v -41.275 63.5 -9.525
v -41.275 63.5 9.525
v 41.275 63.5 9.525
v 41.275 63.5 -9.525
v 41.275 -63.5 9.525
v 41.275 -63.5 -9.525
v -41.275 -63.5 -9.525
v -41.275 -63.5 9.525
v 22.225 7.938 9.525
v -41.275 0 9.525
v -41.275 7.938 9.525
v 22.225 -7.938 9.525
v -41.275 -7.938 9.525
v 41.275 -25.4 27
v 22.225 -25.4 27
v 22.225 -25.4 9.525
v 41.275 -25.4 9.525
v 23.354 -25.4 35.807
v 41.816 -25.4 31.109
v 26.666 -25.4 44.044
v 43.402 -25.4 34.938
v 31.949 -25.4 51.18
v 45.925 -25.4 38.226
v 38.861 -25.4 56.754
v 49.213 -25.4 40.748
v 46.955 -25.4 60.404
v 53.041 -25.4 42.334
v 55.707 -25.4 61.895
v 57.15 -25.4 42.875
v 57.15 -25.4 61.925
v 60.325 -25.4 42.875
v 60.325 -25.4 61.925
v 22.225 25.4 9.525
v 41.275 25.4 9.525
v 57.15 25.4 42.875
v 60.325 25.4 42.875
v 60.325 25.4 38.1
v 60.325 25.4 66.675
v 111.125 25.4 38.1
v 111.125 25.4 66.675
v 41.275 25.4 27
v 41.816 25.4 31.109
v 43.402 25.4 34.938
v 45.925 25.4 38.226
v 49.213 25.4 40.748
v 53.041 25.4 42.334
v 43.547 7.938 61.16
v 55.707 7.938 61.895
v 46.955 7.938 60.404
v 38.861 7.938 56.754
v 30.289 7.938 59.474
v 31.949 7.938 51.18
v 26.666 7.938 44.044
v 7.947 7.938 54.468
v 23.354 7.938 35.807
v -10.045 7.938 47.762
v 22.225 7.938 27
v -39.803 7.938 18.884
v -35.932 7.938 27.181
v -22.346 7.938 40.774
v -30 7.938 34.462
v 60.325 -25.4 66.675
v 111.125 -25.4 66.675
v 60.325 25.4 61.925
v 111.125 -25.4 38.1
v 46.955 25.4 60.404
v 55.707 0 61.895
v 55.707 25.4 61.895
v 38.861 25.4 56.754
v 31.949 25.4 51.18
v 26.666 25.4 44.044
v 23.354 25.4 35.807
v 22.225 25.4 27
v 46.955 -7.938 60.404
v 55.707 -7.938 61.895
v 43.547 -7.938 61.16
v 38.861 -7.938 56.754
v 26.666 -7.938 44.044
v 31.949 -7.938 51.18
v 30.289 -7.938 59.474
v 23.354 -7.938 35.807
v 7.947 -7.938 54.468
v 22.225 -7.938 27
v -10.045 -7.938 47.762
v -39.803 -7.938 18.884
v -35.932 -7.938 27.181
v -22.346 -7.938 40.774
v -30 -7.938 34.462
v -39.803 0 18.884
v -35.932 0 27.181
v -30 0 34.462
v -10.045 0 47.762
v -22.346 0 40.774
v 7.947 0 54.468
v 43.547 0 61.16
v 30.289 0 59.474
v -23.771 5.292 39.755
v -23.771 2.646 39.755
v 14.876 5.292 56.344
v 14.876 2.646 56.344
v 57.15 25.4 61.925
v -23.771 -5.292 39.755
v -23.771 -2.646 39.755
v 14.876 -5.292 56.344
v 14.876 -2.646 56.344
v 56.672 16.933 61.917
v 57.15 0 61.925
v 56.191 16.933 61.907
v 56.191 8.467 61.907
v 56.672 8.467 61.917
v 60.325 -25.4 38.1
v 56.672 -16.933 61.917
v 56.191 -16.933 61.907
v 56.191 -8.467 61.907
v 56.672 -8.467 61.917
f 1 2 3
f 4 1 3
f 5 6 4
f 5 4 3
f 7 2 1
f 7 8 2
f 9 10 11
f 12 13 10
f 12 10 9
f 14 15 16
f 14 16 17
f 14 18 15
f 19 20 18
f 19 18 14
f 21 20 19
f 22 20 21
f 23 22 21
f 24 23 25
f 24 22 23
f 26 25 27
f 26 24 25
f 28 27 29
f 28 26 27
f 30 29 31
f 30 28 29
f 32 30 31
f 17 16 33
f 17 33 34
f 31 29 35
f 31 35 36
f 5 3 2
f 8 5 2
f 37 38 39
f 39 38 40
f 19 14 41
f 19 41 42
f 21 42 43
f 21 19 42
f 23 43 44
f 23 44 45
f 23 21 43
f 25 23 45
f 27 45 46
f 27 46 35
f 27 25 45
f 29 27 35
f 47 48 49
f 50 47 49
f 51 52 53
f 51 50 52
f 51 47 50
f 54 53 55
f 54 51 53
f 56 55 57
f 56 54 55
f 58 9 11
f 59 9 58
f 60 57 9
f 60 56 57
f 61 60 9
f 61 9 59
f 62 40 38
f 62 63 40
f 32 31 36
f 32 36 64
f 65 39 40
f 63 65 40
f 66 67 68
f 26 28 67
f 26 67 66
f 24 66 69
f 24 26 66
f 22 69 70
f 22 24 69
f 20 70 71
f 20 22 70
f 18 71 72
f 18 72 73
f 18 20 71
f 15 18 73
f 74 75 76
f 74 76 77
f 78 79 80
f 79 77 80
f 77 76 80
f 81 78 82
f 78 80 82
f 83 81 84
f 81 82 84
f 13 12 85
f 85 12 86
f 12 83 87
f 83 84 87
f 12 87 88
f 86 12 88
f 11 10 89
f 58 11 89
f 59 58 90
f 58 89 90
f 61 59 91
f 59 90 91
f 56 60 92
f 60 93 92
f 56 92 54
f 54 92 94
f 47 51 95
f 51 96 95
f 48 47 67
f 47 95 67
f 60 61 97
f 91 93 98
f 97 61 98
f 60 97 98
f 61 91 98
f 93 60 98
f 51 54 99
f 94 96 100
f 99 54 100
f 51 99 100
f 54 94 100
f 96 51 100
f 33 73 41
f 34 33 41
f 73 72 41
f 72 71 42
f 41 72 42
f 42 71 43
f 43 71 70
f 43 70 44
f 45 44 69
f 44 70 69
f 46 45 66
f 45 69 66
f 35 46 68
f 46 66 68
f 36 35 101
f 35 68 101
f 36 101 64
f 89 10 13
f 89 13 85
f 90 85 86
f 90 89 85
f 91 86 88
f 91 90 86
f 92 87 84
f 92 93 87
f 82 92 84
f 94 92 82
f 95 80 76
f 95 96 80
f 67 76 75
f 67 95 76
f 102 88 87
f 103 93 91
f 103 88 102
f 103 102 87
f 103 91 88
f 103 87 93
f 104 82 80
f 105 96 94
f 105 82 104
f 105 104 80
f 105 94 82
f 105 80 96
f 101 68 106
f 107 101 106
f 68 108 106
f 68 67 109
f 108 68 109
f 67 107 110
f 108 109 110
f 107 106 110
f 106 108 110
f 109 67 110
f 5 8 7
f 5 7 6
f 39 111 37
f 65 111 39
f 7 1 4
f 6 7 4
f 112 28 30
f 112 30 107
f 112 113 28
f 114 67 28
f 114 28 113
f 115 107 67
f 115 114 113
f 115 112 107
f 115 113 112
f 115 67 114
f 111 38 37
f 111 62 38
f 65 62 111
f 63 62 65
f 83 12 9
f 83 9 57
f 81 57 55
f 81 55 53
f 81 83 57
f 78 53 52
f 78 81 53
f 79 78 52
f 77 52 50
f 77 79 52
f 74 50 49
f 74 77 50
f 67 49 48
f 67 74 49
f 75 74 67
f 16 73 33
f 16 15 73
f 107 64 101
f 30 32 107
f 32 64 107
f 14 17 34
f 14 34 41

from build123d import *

# Parameters (mm, degrees)
F1_DEPTH = 63.5
F2_DEPTH = 25.4
F0_W     = 28.9387143025
F0_H     = 4.7498
F0_H_2   = 19.05
F0_H_3   = 4.7752
F3_DEPTH = 25.4
F4_DEPTH = 7.9375


with BuildPart() as f1:
    # F0 (on Front) → F1 (new body, symmetric)
    with BuildSketch(Plane.XZ):
        Polygon((22.225, 9.525), (-41.275, 9.525), (-41.275, -9.525), (41.275, -9.525), (41.275, 9.525), align=None)
    extrude(amount=F1_DEPTH, both=True)


with BuildPart() as f2:
    # F0 (on Front) → F2 (new body, symmetric)
    with BuildSketch(Plane.XZ):
        with BuildLine():
            Line((22.225, 27.0002), (22.225, 9.525))
            Line((22.225, 9.525), (41.275, 9.525))
            Line((41.275, 9.525), (41.275, 27.0002))
            ThreePointArc((41.275, 27.0002), (45.9246798487, 38.2255201513), (57.15, 42.8752))
            Line((57.15, 42.8752), (60.325, 42.8752))
            Line((60.325, 42.8752), (60.325, 61.9252))
            Line((60.325, 61.9252), (57.15, 61.9252))
            add(Edge.make_bspline(
                [(55.7073045323, 61.8953895651), (56.1929570758, 61.9076703241), (56.6739277433, 61.9175972221), (57.15, 61.9252)],
                knots=[110.0040076177, 110.0040076177, 110.0040076177, 110.0040076177, 111.5045361635, 111.5045361635, 111.5045361635, 111.5045361635], degree=3))
            ThreePointArc((55.7073045323, 61.8953895651), (31.9493872673, 51.1804552281), (22.225, 27.0002))
        make_face()
    extrude(amount=F2_DEPTH, both=True)


with BuildPart() as f3:
    # F0 (on Front) → F3 (new body, symmetric)
    with BuildSketch(Plane.XZ):
        with Locations((74.7943571512, 64.3001)):
            Rectangle(F0_W, F0_H)
        with Locations((74.7943571512, 52.4002)):
            Rectangle(F0_W, F0_H_2)
        Polygon((89.2637143025, 66.675), (89.2637143025, 61.9252), (89.2637143025, 42.8752), (89.2637143025, 38.1), (111.125, 38.1), (111.125, 66.675), align=None)
        with Locations((74.7943571512, 40.4876)):
            Rectangle(F0_W, F0_H_3)
    extrude(amount=F3_DEPTH, both=True)


with BuildPart() as f4:
    # F0 (on Front) → F4 (new body, symmetric)
    with BuildSketch(Plane.XZ):
        with BuildLine():
            add(Edge.make_bspline(
                [(-41.275, 9.525), (-40.661426945, 47.4442333793), (20.104032448, 60.995084997), (55.7073045323, 61.8953895651)],
                knots=[0, 0, 0, 0, 110.0040076177, 110.0040076177, 110.0040076177, 110.0040076177], degree=3))
            Line((-41.275, 9.525), (22.225, 9.525))
            Line((22.225, 9.525), (22.225, 27.0002))
            ThreePointArc((22.225, 27.0002), (31.9493872673, 51.1804552281), (55.7073045323, 61.8953895651))
        make_face()
    extrude(amount=F4_DEPTH, both=True)


solid = Compound([f1.part, f2.part, f3.part, f4.part])
